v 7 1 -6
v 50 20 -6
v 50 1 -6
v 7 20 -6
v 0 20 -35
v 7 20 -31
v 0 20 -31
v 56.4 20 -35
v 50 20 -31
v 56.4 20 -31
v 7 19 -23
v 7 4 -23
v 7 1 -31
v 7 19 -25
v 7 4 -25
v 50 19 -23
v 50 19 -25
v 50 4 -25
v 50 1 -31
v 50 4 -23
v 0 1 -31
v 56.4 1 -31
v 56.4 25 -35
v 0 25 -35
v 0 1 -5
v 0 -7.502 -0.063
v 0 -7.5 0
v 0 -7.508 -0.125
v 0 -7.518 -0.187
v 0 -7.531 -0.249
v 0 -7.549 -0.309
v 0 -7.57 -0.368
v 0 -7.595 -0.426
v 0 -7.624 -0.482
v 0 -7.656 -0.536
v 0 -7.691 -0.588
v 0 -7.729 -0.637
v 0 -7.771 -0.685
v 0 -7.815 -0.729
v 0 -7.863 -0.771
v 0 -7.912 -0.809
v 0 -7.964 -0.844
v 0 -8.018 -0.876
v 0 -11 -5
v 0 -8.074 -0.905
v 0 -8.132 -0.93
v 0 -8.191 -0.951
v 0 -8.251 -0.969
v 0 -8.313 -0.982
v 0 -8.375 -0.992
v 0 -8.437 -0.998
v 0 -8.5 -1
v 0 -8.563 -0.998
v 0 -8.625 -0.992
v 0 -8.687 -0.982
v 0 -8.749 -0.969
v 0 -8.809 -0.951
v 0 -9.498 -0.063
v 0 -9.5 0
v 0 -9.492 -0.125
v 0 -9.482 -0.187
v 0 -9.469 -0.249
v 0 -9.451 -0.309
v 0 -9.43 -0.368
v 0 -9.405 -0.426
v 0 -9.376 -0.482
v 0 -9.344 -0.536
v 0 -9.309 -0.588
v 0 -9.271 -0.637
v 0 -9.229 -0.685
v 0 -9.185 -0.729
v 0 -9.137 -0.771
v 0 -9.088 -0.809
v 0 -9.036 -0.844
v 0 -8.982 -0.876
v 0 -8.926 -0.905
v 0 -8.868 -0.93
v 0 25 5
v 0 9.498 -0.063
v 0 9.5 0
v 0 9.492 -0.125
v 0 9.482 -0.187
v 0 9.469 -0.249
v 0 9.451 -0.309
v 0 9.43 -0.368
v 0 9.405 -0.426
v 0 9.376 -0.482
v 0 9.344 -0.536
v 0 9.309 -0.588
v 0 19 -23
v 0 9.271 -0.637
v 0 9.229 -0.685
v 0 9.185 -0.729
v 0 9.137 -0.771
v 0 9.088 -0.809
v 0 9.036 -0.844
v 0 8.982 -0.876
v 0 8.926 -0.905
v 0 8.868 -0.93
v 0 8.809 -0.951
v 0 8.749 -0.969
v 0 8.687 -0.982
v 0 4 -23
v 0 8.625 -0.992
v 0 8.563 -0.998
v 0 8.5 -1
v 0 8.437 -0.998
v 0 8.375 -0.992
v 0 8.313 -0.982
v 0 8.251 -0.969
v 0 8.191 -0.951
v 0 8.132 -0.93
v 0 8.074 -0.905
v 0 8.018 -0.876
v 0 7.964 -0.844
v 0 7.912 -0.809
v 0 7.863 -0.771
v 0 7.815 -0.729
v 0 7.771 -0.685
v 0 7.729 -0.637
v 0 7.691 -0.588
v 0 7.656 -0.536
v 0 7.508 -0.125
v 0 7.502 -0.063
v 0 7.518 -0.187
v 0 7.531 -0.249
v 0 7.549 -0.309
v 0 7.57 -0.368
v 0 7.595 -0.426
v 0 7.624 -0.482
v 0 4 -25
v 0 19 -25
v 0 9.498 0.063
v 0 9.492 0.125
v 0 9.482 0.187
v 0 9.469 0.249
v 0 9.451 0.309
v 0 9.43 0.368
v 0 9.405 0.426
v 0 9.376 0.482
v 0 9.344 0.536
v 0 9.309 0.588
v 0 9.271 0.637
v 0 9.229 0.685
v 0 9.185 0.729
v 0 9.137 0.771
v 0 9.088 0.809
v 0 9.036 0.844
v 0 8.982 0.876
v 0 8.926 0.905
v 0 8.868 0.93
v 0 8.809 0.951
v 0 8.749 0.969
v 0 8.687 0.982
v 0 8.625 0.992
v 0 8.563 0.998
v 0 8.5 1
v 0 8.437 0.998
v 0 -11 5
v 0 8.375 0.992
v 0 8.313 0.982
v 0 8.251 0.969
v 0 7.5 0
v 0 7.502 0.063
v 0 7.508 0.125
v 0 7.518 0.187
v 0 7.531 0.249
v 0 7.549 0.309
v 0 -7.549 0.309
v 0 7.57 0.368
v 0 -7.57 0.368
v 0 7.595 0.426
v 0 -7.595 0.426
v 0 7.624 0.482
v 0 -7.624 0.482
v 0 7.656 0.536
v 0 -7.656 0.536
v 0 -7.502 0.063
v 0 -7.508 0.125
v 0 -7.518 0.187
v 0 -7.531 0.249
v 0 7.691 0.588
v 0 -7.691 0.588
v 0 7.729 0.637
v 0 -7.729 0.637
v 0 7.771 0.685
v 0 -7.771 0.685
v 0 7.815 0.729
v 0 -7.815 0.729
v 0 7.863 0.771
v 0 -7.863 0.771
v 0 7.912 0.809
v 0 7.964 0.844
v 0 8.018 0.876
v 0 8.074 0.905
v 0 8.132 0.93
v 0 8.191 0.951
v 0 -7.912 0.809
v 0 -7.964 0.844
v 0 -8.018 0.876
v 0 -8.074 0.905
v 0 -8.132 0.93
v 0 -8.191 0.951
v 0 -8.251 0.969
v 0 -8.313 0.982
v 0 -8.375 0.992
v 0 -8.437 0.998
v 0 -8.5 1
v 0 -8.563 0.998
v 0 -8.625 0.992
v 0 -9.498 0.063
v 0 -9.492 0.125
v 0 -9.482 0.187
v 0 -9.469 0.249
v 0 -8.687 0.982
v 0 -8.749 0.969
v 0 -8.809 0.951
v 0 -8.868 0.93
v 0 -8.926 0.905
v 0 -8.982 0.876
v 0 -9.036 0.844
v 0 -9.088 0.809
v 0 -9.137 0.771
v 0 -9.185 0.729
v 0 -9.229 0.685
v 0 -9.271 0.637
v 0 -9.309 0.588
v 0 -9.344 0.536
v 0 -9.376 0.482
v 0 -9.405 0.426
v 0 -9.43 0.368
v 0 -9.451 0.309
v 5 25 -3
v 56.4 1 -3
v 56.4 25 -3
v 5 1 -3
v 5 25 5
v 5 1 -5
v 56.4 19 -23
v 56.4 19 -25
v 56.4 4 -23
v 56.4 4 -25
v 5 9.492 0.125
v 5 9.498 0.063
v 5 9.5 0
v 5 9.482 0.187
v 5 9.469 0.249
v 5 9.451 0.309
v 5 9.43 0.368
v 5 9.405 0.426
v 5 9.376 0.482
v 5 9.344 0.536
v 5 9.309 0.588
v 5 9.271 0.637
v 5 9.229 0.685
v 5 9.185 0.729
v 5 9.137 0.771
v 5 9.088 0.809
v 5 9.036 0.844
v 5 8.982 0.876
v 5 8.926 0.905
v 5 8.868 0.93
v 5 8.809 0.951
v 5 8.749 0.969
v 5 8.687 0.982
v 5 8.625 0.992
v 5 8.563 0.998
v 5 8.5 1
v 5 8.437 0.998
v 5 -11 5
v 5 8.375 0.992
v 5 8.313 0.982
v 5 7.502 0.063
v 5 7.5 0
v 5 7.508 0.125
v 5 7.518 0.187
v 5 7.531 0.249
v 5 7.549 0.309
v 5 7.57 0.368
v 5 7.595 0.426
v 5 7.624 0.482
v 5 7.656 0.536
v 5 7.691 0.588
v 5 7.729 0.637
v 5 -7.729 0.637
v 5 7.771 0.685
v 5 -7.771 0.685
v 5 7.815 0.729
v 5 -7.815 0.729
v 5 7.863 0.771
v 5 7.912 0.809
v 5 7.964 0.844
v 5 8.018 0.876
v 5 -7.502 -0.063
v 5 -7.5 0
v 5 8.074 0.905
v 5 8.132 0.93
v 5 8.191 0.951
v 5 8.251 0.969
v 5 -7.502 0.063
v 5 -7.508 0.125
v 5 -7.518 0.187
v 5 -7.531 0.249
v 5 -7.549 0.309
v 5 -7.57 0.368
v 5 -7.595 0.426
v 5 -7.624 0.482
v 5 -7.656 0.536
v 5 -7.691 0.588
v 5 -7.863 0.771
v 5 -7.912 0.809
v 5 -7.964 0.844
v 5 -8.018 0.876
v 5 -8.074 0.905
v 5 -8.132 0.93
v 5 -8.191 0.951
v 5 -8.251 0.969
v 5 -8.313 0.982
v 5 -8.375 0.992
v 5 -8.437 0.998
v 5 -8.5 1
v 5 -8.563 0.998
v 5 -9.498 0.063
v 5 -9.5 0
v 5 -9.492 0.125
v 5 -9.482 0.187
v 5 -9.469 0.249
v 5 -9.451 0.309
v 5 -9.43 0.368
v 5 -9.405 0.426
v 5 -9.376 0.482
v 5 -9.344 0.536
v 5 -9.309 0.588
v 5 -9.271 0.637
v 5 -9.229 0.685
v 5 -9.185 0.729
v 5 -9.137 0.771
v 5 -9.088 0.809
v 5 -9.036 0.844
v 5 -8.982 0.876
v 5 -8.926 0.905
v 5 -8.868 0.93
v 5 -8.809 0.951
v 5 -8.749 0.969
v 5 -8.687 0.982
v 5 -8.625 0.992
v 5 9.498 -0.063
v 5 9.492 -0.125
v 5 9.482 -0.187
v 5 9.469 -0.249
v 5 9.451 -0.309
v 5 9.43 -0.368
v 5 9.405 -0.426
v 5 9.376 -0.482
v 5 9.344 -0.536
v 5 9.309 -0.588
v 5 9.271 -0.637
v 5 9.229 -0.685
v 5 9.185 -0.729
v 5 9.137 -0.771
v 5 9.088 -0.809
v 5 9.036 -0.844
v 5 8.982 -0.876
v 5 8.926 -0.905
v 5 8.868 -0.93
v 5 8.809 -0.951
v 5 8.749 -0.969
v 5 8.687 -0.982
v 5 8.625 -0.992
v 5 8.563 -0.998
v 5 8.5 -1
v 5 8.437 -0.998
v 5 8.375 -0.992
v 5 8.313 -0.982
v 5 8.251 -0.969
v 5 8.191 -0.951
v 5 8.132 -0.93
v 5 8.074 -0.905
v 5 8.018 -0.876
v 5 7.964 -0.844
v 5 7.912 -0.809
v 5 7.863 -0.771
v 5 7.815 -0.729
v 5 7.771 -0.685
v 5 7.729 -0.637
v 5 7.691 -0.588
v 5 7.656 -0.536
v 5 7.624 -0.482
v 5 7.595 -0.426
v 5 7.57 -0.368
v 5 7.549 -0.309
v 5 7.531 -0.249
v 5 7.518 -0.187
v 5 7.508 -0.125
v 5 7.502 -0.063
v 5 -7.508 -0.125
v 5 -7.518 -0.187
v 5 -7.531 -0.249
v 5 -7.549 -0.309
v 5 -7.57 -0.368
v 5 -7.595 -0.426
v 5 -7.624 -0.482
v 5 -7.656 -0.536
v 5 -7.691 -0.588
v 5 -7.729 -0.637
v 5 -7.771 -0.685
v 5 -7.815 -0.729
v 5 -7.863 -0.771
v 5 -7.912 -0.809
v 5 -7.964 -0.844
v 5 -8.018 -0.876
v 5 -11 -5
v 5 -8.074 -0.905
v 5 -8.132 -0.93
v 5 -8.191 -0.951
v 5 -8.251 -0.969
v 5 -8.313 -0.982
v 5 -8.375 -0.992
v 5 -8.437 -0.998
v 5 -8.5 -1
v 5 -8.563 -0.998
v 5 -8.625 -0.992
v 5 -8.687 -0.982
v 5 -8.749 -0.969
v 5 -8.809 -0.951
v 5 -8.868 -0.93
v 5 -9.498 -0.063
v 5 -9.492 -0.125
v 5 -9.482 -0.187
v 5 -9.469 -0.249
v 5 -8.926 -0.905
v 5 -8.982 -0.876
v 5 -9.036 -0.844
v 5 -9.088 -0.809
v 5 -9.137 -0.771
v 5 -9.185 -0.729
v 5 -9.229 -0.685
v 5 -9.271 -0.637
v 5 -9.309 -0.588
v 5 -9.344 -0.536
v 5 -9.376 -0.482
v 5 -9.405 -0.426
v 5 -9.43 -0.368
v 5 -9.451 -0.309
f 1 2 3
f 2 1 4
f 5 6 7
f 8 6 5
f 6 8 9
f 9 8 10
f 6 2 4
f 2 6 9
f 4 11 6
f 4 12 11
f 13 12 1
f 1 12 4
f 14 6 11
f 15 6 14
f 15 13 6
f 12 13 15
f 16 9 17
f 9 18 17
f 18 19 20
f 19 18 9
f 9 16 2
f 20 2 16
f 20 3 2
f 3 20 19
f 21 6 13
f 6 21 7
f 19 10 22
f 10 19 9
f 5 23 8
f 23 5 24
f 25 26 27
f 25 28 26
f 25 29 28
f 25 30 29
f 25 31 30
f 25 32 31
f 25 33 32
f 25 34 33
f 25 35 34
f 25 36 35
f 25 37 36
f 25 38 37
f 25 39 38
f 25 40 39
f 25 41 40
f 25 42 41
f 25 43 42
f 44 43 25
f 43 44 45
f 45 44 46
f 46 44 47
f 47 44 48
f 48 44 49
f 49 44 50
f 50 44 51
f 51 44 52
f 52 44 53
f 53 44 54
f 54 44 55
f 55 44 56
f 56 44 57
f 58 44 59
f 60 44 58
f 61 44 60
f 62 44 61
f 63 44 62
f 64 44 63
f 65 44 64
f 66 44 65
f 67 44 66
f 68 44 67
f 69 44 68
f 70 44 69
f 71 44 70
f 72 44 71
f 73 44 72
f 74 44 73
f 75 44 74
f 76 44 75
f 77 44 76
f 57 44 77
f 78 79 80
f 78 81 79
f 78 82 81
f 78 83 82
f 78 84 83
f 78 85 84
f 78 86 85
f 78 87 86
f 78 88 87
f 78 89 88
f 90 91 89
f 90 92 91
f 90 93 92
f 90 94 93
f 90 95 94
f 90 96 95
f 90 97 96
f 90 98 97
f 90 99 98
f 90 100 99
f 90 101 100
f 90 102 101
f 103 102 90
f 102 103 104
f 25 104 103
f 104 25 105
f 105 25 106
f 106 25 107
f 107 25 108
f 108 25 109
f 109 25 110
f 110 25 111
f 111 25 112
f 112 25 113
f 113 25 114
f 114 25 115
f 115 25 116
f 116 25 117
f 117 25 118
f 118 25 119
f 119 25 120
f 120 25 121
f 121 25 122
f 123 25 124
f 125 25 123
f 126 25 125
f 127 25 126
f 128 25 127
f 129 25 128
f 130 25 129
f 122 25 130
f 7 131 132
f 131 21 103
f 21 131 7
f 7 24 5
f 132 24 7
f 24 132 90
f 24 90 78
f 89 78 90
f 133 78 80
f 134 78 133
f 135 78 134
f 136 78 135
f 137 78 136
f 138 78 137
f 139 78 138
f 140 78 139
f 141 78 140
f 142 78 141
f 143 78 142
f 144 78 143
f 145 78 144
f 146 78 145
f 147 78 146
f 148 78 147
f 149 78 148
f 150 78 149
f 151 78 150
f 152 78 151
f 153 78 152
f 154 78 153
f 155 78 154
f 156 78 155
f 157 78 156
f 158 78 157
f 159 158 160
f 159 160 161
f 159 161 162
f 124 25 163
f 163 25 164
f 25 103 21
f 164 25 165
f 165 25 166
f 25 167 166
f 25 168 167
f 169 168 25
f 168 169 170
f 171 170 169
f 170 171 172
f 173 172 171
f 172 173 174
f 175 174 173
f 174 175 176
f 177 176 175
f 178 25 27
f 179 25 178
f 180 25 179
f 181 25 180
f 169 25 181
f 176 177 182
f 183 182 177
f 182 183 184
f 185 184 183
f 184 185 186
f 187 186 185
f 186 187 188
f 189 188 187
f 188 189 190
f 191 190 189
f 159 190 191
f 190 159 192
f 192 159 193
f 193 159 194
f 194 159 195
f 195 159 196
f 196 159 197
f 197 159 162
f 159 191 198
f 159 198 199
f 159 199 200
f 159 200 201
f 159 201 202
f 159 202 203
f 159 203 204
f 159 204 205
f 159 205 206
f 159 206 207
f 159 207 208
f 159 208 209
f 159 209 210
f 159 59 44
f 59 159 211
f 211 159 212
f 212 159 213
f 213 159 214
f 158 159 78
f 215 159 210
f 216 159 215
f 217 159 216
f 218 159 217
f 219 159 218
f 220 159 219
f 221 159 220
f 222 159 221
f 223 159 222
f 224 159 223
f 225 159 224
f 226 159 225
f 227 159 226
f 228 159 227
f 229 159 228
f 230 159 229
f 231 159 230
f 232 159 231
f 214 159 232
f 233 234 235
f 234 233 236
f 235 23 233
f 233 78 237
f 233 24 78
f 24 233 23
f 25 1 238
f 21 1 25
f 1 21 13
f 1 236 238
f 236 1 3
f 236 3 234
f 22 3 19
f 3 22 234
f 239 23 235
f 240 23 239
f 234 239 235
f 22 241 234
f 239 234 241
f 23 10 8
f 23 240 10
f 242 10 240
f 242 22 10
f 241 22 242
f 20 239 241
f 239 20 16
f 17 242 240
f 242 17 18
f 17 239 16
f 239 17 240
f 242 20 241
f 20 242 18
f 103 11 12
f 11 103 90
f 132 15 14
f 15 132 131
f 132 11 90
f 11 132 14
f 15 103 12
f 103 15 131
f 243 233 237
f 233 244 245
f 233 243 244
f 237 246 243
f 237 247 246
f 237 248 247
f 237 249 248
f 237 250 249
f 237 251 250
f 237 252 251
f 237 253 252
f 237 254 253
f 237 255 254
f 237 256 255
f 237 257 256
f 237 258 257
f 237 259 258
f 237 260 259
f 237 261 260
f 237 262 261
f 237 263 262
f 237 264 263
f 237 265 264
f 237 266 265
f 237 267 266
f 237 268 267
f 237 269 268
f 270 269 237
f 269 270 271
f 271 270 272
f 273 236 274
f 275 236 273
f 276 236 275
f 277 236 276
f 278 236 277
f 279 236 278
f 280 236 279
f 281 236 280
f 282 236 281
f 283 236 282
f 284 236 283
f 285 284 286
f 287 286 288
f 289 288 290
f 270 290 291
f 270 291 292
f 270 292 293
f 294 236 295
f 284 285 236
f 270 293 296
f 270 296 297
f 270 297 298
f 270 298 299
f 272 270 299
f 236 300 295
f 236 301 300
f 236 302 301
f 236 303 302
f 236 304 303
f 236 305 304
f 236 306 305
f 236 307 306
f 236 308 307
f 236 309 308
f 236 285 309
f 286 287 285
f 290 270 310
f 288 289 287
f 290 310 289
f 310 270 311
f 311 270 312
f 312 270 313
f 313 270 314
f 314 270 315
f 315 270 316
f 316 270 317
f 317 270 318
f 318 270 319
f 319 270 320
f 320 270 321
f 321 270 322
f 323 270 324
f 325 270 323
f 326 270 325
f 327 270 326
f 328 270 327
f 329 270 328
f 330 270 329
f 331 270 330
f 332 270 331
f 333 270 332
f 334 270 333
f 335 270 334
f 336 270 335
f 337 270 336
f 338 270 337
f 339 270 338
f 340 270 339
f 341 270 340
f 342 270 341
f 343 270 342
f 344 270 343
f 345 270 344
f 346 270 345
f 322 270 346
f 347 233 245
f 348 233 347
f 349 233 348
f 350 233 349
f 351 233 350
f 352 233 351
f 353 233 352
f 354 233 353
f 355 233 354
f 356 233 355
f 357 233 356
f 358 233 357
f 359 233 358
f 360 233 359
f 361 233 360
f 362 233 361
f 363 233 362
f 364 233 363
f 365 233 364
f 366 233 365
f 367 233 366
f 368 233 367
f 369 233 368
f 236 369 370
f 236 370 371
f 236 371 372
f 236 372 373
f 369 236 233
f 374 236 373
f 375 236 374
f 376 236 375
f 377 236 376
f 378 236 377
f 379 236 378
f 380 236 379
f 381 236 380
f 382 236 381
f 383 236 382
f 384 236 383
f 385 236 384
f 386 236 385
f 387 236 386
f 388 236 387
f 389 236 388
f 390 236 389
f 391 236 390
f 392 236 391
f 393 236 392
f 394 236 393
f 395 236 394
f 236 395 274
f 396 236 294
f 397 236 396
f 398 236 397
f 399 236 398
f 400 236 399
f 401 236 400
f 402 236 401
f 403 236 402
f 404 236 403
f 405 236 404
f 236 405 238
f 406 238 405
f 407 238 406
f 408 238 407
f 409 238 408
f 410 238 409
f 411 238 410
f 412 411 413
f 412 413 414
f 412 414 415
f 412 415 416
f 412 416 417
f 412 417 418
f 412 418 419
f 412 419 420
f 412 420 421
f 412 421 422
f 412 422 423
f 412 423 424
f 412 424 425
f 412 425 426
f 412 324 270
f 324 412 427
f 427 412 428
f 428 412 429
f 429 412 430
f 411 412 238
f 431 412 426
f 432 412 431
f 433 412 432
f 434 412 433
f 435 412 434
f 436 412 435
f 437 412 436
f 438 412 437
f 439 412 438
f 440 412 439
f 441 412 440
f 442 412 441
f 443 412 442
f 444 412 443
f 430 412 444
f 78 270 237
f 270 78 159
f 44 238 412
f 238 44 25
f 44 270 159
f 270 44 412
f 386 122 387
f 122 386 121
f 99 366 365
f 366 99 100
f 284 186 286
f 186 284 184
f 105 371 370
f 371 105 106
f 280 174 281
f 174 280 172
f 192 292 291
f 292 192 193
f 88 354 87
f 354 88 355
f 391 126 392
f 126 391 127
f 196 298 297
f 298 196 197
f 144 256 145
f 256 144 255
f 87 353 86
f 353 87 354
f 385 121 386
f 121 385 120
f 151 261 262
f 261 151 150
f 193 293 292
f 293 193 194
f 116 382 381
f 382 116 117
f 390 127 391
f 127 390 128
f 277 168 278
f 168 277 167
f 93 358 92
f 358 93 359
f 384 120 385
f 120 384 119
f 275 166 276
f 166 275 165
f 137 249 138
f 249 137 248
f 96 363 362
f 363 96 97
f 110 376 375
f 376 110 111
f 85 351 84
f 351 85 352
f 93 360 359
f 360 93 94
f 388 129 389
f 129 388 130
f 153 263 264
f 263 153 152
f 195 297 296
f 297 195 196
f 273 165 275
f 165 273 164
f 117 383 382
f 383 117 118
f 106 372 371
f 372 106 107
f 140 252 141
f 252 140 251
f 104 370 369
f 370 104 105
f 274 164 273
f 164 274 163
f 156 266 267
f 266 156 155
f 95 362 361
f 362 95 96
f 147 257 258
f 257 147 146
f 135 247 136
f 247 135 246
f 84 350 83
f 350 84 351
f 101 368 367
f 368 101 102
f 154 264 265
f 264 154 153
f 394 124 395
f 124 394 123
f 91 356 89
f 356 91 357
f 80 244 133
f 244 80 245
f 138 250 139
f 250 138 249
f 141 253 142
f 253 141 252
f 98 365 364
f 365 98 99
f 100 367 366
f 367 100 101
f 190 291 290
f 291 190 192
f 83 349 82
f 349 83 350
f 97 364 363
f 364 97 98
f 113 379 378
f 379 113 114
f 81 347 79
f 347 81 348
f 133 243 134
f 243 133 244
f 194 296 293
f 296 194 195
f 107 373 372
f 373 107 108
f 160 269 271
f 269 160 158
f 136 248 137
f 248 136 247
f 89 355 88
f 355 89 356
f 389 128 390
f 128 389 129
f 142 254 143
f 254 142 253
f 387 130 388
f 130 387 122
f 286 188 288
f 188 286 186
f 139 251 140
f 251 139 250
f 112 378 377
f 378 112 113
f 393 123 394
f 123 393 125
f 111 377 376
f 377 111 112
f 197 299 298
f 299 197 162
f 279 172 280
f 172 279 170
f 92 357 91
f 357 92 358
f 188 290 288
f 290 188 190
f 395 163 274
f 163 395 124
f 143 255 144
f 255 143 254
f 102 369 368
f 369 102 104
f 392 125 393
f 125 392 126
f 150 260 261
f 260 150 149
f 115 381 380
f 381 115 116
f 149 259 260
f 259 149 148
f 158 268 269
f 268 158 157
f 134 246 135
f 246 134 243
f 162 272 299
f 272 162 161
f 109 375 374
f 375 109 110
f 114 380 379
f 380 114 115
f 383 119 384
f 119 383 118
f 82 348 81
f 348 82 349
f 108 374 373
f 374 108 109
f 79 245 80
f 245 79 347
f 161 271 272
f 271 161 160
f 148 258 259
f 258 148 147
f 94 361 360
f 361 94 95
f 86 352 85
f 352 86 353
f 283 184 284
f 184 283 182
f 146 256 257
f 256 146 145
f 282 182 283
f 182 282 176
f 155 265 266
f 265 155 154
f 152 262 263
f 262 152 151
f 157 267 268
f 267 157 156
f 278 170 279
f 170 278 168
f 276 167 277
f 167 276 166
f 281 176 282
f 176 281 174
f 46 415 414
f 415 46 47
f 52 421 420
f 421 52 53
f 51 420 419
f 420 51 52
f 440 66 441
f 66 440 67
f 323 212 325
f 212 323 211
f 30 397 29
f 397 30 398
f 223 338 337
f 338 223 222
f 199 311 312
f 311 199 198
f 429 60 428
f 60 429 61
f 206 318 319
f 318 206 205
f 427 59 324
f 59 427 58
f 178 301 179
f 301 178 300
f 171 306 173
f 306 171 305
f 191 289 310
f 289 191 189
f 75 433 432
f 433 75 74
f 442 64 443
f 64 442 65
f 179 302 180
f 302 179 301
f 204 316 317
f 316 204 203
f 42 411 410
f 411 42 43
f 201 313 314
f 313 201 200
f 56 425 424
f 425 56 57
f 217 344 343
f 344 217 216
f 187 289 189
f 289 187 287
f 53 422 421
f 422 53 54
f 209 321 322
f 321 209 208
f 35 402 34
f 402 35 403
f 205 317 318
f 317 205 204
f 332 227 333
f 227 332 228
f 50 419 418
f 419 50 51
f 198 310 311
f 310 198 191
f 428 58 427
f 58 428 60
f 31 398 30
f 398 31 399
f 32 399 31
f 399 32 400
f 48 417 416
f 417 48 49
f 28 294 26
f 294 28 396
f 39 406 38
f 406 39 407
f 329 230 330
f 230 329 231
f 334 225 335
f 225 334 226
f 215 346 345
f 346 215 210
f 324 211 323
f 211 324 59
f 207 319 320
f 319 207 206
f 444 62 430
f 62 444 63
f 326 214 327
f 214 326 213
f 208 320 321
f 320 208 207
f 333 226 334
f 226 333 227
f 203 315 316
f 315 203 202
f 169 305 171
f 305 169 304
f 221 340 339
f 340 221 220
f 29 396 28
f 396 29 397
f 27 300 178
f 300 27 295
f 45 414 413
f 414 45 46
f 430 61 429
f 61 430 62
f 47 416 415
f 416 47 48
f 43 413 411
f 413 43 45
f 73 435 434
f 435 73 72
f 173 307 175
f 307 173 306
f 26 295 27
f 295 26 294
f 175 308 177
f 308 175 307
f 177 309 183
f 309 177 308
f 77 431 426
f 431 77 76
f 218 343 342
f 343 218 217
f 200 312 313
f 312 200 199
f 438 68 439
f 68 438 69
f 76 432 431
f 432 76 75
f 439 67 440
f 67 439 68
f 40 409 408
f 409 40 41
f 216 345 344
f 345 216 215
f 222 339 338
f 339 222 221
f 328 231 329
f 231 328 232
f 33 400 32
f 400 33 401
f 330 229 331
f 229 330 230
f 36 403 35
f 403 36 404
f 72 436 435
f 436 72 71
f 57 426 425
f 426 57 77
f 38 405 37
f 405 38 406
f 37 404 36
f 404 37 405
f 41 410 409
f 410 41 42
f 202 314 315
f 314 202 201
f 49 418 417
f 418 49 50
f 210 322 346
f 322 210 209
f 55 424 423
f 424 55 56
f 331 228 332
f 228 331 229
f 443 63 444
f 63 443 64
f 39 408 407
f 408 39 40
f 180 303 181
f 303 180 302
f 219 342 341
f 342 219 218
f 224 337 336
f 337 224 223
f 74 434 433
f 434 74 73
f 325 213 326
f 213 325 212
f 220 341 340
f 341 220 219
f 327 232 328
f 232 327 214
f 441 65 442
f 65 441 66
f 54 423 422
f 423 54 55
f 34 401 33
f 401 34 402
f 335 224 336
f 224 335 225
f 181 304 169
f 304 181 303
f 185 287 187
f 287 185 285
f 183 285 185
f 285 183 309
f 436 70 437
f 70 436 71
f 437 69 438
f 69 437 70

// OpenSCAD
$fn=100;

module base()
{
		translate([0,-11,-5]) cube([5,36,10]);
}

module vis()
{
	rotate([0,90,0]) translate([0,8.5,0]) cylinder(d=2, h=10);
	rotate([0,90,0]) translate([0,-8.5,0]) cylinder(d=2, h=10);
}

module servo()
{
	translate([0,0,0])       cube([20,43,36]);
   #translate([0,-6.5,25]) cube([20,57,10]);
   translate([10,10,36]) cylinder(d=15, h=2);
}

module porte_servo()
{
	difference()
	{
		translate([0,25,-3]) rotate([180,0,0]) cube([56.4,24,32]);
		translate([50,20,-6]) rotate([180,0,270]) servo();
		//translate([50,7,-9]) cube([7,9,3]);
		translate([50,4,-25]) cube([7,15,2]);
		translate([0,4,-25]) cube([7,15,2]);
	}
}

difference()
{
	union()
	{
		base();
		porte_servo();
	}
		vis();
	
}
